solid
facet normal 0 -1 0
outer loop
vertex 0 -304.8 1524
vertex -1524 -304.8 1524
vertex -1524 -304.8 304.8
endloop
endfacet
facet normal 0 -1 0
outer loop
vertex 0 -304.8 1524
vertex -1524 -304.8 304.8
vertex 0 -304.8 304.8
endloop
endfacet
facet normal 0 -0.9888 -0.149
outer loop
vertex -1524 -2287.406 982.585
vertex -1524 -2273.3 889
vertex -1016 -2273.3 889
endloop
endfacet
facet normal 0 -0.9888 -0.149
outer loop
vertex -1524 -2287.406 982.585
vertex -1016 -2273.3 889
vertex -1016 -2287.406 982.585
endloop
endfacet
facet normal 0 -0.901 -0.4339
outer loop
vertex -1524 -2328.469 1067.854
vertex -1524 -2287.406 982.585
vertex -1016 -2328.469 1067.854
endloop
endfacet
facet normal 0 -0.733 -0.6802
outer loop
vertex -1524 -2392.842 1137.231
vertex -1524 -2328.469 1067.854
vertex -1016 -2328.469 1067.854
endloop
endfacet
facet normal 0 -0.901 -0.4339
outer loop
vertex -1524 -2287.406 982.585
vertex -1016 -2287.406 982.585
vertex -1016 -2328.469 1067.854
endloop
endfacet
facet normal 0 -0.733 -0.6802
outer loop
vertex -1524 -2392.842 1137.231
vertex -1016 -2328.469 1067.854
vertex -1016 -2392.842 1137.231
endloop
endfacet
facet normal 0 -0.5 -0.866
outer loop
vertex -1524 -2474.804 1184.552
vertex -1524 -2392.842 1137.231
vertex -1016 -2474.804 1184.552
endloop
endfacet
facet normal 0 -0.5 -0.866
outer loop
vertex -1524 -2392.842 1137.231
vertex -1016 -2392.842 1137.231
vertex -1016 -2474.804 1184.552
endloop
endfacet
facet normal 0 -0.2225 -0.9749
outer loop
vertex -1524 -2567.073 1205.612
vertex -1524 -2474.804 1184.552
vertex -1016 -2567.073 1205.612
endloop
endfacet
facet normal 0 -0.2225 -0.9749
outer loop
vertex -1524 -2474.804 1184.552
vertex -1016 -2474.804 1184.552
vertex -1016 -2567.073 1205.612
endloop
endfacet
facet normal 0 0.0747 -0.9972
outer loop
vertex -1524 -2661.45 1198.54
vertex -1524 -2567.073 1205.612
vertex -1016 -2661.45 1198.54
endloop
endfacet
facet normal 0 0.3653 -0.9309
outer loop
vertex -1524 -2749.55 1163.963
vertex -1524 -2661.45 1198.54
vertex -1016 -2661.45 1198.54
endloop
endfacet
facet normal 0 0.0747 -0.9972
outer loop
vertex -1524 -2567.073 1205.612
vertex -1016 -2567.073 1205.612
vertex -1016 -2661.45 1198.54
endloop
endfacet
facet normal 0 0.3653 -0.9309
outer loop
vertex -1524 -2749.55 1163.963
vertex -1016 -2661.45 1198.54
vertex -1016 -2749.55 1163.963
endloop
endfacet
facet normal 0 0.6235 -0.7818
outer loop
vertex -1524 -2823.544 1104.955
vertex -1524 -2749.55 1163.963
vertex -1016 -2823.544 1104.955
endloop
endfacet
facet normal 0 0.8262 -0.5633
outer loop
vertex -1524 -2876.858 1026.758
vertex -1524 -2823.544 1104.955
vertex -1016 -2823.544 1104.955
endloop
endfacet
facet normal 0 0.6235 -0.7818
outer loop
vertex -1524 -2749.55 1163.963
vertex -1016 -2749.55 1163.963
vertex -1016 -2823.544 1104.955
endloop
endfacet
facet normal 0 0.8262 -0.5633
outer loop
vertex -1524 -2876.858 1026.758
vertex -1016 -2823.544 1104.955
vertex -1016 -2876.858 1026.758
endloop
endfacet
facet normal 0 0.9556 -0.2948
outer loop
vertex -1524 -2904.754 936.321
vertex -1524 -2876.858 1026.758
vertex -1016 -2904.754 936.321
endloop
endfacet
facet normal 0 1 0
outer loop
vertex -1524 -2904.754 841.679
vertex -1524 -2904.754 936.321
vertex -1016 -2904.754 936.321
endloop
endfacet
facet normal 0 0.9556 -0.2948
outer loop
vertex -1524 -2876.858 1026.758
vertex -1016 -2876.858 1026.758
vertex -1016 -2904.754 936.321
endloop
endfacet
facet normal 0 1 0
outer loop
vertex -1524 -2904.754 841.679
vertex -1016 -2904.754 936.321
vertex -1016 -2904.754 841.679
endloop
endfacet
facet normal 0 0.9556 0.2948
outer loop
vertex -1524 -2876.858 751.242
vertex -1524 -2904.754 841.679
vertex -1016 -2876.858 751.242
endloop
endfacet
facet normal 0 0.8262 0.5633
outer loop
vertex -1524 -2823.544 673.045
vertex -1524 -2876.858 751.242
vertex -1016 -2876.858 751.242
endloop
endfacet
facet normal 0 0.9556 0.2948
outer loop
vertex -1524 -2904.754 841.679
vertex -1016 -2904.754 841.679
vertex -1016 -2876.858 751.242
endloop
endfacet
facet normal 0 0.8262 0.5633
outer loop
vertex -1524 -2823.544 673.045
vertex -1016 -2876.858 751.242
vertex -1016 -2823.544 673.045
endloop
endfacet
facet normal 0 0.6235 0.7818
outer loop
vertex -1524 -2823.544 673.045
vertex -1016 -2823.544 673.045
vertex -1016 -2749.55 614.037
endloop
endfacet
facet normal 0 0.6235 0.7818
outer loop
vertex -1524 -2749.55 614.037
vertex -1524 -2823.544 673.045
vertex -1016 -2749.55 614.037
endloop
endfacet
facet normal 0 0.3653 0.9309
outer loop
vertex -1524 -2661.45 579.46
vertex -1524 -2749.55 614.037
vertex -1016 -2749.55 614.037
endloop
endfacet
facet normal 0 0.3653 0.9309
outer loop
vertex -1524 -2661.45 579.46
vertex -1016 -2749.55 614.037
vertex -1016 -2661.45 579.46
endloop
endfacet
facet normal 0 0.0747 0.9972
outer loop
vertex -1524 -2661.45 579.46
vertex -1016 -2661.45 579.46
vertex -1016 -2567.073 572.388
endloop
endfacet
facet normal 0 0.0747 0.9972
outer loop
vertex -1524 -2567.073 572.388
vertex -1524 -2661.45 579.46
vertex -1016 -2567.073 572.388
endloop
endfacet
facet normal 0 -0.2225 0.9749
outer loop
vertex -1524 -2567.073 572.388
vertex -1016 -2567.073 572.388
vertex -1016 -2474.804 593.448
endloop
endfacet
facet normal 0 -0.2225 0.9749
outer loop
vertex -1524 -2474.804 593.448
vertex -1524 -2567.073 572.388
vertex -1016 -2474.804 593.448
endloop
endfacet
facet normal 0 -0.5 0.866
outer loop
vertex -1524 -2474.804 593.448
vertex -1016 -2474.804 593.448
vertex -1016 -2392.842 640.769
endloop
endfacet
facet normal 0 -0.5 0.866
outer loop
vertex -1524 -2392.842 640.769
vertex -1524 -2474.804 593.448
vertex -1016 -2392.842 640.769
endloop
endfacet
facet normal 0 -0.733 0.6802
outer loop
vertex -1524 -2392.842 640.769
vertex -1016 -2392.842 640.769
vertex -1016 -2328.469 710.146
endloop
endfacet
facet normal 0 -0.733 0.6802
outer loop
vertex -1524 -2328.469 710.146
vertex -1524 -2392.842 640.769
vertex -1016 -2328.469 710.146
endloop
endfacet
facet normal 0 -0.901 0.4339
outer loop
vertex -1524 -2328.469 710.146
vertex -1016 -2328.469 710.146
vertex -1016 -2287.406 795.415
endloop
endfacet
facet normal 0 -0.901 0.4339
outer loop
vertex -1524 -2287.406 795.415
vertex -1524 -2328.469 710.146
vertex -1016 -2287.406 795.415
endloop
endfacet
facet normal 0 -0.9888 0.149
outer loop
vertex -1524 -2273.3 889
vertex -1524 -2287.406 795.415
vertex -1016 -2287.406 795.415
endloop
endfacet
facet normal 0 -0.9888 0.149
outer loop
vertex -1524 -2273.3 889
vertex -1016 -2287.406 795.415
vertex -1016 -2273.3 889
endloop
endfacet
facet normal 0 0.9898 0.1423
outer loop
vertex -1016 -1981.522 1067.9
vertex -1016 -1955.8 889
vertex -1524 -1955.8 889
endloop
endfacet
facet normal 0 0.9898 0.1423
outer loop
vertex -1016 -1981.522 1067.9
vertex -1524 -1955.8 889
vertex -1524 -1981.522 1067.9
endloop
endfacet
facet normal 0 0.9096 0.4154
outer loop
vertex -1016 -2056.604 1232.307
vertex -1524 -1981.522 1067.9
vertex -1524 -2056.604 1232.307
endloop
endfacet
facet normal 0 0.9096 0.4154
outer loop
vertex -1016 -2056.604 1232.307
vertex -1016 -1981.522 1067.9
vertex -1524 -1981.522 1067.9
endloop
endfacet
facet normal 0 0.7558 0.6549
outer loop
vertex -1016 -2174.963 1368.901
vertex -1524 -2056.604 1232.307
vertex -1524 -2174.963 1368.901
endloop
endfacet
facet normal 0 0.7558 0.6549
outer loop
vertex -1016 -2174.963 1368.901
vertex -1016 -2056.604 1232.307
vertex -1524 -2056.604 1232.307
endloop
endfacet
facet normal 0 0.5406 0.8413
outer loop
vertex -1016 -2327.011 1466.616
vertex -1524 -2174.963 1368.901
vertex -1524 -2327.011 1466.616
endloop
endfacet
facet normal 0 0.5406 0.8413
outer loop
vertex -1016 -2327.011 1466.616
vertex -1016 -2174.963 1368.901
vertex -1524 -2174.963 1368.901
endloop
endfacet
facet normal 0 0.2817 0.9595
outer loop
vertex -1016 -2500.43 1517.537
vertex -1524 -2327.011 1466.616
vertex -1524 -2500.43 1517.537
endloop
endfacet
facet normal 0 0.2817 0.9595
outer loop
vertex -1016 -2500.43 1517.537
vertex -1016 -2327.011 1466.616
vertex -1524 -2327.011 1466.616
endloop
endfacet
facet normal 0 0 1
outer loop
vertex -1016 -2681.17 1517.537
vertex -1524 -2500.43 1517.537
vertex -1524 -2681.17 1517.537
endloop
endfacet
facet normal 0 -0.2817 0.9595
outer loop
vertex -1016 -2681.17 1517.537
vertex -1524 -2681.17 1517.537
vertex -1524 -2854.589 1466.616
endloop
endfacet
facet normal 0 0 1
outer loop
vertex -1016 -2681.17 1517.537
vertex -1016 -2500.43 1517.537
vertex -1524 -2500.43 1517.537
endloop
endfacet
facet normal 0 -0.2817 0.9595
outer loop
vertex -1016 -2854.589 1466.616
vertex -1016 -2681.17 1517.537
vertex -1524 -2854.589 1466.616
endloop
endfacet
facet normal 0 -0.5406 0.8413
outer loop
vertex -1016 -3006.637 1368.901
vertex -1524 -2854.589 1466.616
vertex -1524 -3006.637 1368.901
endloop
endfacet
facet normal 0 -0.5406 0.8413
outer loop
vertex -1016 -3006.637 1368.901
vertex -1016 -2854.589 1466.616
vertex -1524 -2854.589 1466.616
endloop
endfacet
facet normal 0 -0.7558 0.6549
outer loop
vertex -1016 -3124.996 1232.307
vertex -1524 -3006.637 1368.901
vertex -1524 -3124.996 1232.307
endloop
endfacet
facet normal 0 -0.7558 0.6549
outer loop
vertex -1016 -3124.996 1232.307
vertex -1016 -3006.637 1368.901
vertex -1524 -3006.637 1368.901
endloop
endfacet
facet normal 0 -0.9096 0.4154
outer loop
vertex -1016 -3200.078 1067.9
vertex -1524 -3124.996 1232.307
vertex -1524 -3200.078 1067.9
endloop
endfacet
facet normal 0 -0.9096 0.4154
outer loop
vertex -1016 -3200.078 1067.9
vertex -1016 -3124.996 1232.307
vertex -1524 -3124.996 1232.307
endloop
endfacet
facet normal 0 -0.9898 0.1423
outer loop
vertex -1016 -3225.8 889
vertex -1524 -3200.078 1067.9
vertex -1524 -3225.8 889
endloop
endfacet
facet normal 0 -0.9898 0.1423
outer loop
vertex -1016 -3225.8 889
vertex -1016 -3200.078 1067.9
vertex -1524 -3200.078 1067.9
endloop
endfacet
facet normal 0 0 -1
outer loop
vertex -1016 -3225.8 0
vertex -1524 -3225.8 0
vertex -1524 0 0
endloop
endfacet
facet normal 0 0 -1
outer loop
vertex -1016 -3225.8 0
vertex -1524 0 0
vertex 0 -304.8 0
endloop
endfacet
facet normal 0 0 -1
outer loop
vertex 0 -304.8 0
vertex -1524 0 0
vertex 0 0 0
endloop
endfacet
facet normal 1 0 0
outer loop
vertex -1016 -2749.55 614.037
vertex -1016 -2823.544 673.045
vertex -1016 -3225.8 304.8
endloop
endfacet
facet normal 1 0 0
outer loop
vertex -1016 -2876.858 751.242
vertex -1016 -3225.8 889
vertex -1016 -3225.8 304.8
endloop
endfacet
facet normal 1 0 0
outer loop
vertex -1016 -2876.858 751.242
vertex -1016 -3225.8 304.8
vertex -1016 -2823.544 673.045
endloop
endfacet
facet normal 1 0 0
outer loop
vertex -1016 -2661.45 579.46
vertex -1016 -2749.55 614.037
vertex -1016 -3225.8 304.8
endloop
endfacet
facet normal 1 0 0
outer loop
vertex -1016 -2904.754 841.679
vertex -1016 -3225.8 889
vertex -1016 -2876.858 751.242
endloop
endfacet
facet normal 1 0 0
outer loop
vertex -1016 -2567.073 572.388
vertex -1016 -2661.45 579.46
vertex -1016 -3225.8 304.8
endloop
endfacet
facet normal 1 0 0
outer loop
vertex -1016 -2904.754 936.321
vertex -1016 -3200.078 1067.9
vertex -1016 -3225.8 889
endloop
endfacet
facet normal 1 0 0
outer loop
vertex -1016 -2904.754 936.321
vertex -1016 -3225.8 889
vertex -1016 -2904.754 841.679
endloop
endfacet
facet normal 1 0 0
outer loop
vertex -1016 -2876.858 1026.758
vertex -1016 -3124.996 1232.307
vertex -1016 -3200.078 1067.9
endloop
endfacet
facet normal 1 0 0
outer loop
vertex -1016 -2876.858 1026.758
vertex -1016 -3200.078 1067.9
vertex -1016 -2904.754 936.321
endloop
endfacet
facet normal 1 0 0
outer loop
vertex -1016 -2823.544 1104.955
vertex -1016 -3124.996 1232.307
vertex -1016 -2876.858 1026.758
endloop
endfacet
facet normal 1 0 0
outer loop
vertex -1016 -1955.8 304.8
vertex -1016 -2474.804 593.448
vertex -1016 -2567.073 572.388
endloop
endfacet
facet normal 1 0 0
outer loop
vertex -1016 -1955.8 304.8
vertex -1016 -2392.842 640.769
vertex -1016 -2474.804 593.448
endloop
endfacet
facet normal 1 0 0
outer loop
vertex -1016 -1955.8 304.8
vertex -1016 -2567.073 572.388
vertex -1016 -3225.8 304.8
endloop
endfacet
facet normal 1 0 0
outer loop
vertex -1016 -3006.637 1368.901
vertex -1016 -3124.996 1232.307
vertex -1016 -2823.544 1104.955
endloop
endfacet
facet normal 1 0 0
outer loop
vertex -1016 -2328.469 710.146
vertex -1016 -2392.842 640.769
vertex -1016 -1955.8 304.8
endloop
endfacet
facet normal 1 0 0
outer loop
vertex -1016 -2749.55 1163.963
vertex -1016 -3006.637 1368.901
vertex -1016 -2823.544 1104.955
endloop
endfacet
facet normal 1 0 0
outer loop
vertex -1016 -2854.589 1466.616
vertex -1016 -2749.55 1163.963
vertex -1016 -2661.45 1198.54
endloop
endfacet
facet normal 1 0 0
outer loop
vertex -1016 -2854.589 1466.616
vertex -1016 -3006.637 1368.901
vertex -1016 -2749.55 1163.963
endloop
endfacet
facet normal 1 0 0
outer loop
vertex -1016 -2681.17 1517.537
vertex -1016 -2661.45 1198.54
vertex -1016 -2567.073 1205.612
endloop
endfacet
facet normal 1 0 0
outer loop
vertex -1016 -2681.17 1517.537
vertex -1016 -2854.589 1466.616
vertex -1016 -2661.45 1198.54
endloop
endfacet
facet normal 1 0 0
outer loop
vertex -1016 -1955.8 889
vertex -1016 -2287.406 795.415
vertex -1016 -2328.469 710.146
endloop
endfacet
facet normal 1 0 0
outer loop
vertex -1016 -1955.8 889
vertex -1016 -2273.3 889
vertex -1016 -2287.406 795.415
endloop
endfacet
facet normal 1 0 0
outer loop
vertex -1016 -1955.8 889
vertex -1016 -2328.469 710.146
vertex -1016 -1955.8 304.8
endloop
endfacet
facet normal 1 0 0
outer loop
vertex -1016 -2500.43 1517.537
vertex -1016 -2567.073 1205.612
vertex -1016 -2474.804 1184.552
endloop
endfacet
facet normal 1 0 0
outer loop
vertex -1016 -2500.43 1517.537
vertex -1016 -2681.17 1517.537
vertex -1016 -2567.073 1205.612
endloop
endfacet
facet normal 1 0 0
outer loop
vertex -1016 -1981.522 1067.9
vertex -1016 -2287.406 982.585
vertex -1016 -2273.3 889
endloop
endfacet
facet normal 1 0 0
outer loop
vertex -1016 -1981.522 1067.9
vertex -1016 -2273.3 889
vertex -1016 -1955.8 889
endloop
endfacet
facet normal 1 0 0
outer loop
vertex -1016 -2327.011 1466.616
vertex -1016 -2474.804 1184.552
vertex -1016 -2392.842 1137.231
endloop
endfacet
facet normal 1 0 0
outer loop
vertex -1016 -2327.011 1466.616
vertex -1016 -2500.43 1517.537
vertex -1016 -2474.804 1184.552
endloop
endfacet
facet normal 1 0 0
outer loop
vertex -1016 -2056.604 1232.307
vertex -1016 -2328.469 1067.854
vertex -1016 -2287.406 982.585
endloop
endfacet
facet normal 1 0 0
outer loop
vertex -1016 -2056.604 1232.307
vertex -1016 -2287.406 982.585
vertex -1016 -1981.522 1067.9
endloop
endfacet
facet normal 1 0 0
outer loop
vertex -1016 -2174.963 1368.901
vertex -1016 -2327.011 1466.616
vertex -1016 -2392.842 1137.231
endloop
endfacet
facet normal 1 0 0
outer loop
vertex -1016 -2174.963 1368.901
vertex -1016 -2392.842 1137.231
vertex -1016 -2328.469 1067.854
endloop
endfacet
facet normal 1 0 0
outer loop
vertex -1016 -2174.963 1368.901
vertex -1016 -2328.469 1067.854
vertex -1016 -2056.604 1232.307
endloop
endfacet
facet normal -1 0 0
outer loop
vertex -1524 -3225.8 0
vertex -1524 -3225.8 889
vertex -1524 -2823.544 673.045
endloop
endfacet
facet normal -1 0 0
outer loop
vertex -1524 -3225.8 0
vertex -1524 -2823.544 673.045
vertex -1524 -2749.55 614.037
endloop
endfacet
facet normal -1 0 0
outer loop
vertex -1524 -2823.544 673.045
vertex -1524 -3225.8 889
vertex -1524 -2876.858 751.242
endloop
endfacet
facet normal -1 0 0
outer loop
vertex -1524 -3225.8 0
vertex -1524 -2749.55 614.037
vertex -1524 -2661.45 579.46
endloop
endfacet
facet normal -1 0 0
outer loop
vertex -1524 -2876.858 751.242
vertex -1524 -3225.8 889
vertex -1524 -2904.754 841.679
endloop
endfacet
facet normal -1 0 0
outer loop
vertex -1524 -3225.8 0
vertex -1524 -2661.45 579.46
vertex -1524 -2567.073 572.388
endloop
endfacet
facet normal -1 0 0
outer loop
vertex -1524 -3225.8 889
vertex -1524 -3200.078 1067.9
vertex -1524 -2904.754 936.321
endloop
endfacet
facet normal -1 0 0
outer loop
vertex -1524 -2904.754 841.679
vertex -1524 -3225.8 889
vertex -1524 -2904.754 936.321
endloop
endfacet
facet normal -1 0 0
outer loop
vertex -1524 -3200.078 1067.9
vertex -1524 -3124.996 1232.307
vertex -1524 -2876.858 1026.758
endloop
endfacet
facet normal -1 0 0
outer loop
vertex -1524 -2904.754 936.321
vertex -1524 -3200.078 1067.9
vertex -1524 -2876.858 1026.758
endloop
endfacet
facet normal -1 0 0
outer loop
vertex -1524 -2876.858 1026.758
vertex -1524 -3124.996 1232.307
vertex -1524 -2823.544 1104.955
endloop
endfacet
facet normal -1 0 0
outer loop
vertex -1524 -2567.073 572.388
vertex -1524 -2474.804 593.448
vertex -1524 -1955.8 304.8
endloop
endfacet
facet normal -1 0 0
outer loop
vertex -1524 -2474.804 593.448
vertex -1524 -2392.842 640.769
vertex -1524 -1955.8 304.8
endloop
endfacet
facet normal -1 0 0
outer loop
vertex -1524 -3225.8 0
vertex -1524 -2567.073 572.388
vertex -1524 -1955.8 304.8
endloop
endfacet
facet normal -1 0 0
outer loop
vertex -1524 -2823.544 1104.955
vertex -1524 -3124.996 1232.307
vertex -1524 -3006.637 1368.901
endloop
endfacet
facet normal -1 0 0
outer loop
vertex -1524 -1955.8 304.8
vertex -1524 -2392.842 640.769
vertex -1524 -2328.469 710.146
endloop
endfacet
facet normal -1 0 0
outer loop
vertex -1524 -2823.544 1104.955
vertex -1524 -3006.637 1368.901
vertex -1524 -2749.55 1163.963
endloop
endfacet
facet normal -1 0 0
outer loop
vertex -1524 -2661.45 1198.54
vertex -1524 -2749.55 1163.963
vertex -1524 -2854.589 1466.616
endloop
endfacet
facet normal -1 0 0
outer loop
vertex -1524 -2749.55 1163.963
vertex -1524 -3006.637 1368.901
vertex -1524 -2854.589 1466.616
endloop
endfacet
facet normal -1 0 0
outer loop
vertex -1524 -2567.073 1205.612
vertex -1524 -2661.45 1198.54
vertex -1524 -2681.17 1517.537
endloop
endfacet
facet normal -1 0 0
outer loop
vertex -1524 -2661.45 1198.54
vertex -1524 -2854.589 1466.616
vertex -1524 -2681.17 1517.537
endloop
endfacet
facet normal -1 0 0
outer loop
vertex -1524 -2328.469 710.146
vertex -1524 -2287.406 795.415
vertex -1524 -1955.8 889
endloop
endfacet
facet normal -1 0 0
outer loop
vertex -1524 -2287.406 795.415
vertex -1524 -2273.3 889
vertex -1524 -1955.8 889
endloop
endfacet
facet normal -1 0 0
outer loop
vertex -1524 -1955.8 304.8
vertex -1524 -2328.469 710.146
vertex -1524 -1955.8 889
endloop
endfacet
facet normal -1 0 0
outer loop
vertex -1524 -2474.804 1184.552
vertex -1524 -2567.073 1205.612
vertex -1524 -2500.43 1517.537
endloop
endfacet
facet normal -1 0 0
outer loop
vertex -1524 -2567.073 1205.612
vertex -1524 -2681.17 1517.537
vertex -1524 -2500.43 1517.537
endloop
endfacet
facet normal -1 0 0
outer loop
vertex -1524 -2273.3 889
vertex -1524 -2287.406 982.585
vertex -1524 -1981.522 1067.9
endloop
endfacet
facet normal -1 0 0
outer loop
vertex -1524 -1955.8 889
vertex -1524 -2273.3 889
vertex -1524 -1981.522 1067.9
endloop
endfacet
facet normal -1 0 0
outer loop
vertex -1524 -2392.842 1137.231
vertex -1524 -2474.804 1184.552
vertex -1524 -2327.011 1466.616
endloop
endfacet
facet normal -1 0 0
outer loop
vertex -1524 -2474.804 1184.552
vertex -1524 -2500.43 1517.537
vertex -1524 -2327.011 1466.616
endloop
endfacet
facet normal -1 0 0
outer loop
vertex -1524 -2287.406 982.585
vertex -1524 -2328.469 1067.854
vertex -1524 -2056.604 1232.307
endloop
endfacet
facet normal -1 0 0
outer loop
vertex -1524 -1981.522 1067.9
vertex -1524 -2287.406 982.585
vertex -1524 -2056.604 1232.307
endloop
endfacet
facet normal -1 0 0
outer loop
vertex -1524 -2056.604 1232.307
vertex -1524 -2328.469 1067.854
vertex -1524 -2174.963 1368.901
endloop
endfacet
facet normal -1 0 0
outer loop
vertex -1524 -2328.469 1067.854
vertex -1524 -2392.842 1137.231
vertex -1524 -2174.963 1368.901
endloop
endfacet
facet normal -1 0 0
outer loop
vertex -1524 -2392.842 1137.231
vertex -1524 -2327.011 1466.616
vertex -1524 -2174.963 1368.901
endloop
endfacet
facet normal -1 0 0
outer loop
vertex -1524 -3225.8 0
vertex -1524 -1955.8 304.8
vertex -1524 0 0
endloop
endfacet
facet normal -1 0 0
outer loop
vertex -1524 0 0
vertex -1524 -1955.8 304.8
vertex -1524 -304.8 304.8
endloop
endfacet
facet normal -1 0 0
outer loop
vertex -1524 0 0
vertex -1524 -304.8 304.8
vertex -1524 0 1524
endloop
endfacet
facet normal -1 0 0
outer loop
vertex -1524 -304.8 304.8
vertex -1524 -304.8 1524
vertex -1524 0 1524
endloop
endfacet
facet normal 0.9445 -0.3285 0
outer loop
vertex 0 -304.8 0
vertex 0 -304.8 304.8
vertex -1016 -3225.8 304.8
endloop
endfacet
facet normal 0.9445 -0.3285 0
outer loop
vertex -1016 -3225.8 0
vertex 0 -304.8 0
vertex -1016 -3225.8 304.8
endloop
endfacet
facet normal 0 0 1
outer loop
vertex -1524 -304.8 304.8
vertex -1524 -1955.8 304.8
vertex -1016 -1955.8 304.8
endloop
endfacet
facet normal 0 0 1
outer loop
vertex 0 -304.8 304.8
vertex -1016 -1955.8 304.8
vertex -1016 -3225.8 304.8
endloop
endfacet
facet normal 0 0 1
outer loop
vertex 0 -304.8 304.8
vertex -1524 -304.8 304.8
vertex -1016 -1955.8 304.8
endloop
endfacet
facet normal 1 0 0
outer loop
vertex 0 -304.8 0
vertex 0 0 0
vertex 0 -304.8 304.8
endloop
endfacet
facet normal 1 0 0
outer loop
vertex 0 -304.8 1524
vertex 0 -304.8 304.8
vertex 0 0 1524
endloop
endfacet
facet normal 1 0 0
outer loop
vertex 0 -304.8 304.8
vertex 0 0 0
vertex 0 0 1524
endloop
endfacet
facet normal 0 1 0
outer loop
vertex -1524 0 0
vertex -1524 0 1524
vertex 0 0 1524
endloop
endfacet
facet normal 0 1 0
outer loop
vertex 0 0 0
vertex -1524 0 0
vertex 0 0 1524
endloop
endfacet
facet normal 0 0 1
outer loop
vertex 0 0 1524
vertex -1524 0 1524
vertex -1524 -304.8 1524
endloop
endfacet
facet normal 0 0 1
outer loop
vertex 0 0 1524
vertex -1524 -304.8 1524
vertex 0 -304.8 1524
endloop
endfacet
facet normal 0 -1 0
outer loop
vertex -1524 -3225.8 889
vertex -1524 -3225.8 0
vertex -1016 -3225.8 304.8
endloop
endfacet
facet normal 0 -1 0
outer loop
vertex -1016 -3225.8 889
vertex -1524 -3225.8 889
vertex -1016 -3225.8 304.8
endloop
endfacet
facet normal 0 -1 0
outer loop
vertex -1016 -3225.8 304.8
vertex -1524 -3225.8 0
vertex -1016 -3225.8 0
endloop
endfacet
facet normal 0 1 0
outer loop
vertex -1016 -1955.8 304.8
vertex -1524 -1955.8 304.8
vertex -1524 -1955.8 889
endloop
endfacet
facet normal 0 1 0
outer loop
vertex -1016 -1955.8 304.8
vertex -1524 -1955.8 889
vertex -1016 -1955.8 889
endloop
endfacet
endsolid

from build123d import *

# Parameters (mm, degrees)
F0_W      = 1524
F0_H      = 1524
F1_DEPTH  = 304.8
F0_W_2    = 40.8719182014
F0_H_2    = 6.1111450195
F3_W      = 1524
F3_H      = 304.8
F4_DEPTH  = 2921
F5_W      = 508
F5_H      = 1270
F6_DEPTH  = 584.2
F8_DEPTH  = 508
F9_R      = 317.5
F10_DEPTH = 2476.5
F12_DEPTH = 2288.54


with BuildPart() as f1:
    # F0 (on Front) → F1 (new body)
    with BuildSketch(Plane.XZ):
        with Locations((-762, 762)):
            Rectangle(F0_W, F0_H)
    extrude(amount=F1_DEPTH)

    # F3 (on face) → F4 (join)
    with BuildSketch(Plane.XZ.offset(304.8)):
        with Locations((-762, 152.4)):
            Rectangle(F3_W, F3_H)
    extrude(amount=F4_DEPTH)

    # F5 (on face) → F6 (join)
    with BuildSketch(Plane.XY.offset(304.8)):
        with Locations((-1270, -2590.8)):
            Rectangle(F5_W, F5_H)
    extrude(amount=F6_DEPTH)

    # F7 (on face) → F8 (join)
    with BuildSketch(Plane.YZ.offset(-1016)):
        with BuildLine():
            Line((-3225.8, 889), (-1955.8, 889))
            ThreePointArc((-1955.8, 889), (-2590.8, 1524), (-3225.8, 889))
        make_face()
    extrude(amount=-F8_DEPTH)

    # F9 (on face) → F10 (cut)
    with BuildSketch(Plane.YZ.offset(-1016)):
        with Locations((-2590.8, 889)):
            Circle(F9_R)
    extrude(amount=-F10_DEPTH, mode=Mode.SUBTRACT)

    # F11 (on face) → F12 (cut)
    with BuildSketch(Plane.XY.offset(304.8)):
        Polygon((0, -304.8), (-1016, -3225.8), (0, -3225.8), align=None)
    extrude(amount=-F12_DEPTH, mode=Mode.SUBTRACT)


with BuildPart() as f1b:
    # F0 (on Front) → F1, piece 2 (new body)
    with BuildSketch(Plane.XZ):
        with Locations((-394.8256671429, -348.9022254944)):
            Rectangle(F0_W_2, F0_H_2)
    extrude(amount=F1_DEPTH)


solid = f1.part
